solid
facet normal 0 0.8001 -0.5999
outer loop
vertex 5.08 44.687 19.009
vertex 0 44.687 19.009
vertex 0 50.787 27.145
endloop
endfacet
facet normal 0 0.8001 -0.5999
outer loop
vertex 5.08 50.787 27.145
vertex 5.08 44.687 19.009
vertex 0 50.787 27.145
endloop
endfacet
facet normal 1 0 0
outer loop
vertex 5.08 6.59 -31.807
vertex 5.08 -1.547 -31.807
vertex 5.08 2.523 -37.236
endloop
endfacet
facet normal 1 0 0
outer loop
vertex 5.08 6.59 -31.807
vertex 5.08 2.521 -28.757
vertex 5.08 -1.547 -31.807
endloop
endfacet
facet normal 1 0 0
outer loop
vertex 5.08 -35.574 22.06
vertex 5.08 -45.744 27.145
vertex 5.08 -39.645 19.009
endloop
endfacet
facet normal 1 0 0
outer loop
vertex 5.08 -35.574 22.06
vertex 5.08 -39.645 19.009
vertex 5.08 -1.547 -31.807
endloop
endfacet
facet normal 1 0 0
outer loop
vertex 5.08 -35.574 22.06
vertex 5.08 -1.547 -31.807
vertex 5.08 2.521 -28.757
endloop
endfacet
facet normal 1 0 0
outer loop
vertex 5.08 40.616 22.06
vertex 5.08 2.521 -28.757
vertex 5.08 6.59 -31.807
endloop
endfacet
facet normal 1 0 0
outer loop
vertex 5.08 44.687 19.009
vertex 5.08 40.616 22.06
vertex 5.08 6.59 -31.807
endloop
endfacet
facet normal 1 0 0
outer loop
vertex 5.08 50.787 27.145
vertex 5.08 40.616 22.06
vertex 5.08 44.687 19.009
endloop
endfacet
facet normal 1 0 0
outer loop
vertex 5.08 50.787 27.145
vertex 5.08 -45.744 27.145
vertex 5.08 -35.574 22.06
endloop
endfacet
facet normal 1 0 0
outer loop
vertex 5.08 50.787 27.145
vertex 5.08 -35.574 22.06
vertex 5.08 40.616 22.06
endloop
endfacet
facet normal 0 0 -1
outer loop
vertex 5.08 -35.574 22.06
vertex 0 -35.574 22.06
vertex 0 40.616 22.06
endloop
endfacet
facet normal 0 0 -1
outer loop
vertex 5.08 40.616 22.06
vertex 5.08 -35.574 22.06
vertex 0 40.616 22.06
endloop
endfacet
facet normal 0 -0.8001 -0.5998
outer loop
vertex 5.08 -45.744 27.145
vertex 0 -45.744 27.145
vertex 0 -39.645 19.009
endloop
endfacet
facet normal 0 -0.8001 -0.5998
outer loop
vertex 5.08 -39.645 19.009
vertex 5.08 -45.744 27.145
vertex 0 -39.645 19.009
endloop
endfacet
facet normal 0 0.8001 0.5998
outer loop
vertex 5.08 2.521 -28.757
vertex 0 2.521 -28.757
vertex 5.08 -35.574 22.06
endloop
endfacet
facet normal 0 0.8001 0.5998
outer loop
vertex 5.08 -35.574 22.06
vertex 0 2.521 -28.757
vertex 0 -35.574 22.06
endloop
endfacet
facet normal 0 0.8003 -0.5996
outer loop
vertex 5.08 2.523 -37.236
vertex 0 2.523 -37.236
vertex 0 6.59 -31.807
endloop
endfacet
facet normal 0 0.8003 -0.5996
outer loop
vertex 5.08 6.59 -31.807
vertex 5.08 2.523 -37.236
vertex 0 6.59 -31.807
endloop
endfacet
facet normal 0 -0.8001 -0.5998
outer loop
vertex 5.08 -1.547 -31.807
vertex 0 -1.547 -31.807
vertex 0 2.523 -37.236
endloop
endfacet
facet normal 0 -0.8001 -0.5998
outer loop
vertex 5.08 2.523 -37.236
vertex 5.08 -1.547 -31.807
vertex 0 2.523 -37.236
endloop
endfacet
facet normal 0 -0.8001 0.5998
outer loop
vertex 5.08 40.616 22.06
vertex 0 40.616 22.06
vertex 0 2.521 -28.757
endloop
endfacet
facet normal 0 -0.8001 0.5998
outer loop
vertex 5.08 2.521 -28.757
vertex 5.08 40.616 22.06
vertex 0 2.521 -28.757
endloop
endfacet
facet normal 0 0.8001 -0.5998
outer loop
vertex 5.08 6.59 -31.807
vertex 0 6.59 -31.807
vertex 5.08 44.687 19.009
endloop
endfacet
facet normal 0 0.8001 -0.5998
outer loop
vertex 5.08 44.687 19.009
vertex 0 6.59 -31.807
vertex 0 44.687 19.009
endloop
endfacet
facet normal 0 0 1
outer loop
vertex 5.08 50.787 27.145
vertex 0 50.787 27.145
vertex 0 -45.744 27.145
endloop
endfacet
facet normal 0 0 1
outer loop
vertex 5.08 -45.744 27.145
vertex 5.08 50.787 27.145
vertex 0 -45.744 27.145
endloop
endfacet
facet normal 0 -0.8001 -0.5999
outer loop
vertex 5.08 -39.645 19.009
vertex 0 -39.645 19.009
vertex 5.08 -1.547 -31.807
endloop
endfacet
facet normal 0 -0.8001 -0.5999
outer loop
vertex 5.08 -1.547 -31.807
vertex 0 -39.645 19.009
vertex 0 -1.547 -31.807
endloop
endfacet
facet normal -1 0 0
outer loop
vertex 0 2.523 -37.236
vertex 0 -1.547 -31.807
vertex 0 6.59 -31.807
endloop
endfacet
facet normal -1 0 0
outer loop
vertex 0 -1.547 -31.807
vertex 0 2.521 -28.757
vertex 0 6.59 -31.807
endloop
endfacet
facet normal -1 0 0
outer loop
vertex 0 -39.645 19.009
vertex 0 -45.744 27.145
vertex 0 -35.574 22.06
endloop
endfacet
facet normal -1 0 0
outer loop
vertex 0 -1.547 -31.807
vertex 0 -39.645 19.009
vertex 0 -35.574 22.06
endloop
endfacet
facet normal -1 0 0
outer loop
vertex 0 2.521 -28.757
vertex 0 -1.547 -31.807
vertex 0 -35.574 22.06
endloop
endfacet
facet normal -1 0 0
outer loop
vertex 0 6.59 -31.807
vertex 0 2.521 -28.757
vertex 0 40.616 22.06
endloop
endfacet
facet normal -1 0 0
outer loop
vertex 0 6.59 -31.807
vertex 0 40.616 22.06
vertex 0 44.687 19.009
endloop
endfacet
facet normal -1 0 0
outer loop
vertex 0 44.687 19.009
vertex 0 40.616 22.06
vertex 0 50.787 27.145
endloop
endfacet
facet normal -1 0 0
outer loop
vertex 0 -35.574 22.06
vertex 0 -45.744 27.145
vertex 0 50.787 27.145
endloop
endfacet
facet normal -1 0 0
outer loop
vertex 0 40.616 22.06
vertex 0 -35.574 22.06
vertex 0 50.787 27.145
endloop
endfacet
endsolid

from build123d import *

# Parameters (mm, degrees)
F1_DEPTH = 5.08


with BuildPart() as f1:
    # F0 (on Right) → F1 (new body)
    with BuildSketch(Plane.YZ):
        Polygon((-35.573810339, 27.1448735148), (-35.573810339, 22.0602974296), (2.5212168694, 22.0602974296), (40.6162440777, 22.0602974296), (40.6162440777, 27.1448735148), align=None)
        Polygon((-39.6445272604, 19.0086872448), (-35.573810339, 22.0602974296), (-35.573810339, 27.1448735148), (-45.7443889554, 27.1448735148), align=None)
        Polygon((2.5212168694, -28.7568327039), (-35.573810339, 22.0602974296), (-39.6445272604, 19.0086872448), (-1.5472002365, -31.8067188336), align=None)
        Polygon((6.5896339752, -31.8067188336), (2.5212168694, -28.7568327039), (-1.5472002365, -31.8067188336), (2.5232048978, -37.2359524821), align=None)
        Polygon((40.6162440777, 22.0602974296), (2.5212168694, -28.7568327039), (6.5896339752, -31.8067188336), (44.6869609991, 19.0086872448), align=None)
        Polygon((40.6162440777, 27.1448735148), (40.6162440777, 22.0602974296), (44.6869609991, 19.0086872448), (50.7868226941, 27.1448735148), align=None)
    extrude(amount=F1_DEPTH)


solid = f1.part
